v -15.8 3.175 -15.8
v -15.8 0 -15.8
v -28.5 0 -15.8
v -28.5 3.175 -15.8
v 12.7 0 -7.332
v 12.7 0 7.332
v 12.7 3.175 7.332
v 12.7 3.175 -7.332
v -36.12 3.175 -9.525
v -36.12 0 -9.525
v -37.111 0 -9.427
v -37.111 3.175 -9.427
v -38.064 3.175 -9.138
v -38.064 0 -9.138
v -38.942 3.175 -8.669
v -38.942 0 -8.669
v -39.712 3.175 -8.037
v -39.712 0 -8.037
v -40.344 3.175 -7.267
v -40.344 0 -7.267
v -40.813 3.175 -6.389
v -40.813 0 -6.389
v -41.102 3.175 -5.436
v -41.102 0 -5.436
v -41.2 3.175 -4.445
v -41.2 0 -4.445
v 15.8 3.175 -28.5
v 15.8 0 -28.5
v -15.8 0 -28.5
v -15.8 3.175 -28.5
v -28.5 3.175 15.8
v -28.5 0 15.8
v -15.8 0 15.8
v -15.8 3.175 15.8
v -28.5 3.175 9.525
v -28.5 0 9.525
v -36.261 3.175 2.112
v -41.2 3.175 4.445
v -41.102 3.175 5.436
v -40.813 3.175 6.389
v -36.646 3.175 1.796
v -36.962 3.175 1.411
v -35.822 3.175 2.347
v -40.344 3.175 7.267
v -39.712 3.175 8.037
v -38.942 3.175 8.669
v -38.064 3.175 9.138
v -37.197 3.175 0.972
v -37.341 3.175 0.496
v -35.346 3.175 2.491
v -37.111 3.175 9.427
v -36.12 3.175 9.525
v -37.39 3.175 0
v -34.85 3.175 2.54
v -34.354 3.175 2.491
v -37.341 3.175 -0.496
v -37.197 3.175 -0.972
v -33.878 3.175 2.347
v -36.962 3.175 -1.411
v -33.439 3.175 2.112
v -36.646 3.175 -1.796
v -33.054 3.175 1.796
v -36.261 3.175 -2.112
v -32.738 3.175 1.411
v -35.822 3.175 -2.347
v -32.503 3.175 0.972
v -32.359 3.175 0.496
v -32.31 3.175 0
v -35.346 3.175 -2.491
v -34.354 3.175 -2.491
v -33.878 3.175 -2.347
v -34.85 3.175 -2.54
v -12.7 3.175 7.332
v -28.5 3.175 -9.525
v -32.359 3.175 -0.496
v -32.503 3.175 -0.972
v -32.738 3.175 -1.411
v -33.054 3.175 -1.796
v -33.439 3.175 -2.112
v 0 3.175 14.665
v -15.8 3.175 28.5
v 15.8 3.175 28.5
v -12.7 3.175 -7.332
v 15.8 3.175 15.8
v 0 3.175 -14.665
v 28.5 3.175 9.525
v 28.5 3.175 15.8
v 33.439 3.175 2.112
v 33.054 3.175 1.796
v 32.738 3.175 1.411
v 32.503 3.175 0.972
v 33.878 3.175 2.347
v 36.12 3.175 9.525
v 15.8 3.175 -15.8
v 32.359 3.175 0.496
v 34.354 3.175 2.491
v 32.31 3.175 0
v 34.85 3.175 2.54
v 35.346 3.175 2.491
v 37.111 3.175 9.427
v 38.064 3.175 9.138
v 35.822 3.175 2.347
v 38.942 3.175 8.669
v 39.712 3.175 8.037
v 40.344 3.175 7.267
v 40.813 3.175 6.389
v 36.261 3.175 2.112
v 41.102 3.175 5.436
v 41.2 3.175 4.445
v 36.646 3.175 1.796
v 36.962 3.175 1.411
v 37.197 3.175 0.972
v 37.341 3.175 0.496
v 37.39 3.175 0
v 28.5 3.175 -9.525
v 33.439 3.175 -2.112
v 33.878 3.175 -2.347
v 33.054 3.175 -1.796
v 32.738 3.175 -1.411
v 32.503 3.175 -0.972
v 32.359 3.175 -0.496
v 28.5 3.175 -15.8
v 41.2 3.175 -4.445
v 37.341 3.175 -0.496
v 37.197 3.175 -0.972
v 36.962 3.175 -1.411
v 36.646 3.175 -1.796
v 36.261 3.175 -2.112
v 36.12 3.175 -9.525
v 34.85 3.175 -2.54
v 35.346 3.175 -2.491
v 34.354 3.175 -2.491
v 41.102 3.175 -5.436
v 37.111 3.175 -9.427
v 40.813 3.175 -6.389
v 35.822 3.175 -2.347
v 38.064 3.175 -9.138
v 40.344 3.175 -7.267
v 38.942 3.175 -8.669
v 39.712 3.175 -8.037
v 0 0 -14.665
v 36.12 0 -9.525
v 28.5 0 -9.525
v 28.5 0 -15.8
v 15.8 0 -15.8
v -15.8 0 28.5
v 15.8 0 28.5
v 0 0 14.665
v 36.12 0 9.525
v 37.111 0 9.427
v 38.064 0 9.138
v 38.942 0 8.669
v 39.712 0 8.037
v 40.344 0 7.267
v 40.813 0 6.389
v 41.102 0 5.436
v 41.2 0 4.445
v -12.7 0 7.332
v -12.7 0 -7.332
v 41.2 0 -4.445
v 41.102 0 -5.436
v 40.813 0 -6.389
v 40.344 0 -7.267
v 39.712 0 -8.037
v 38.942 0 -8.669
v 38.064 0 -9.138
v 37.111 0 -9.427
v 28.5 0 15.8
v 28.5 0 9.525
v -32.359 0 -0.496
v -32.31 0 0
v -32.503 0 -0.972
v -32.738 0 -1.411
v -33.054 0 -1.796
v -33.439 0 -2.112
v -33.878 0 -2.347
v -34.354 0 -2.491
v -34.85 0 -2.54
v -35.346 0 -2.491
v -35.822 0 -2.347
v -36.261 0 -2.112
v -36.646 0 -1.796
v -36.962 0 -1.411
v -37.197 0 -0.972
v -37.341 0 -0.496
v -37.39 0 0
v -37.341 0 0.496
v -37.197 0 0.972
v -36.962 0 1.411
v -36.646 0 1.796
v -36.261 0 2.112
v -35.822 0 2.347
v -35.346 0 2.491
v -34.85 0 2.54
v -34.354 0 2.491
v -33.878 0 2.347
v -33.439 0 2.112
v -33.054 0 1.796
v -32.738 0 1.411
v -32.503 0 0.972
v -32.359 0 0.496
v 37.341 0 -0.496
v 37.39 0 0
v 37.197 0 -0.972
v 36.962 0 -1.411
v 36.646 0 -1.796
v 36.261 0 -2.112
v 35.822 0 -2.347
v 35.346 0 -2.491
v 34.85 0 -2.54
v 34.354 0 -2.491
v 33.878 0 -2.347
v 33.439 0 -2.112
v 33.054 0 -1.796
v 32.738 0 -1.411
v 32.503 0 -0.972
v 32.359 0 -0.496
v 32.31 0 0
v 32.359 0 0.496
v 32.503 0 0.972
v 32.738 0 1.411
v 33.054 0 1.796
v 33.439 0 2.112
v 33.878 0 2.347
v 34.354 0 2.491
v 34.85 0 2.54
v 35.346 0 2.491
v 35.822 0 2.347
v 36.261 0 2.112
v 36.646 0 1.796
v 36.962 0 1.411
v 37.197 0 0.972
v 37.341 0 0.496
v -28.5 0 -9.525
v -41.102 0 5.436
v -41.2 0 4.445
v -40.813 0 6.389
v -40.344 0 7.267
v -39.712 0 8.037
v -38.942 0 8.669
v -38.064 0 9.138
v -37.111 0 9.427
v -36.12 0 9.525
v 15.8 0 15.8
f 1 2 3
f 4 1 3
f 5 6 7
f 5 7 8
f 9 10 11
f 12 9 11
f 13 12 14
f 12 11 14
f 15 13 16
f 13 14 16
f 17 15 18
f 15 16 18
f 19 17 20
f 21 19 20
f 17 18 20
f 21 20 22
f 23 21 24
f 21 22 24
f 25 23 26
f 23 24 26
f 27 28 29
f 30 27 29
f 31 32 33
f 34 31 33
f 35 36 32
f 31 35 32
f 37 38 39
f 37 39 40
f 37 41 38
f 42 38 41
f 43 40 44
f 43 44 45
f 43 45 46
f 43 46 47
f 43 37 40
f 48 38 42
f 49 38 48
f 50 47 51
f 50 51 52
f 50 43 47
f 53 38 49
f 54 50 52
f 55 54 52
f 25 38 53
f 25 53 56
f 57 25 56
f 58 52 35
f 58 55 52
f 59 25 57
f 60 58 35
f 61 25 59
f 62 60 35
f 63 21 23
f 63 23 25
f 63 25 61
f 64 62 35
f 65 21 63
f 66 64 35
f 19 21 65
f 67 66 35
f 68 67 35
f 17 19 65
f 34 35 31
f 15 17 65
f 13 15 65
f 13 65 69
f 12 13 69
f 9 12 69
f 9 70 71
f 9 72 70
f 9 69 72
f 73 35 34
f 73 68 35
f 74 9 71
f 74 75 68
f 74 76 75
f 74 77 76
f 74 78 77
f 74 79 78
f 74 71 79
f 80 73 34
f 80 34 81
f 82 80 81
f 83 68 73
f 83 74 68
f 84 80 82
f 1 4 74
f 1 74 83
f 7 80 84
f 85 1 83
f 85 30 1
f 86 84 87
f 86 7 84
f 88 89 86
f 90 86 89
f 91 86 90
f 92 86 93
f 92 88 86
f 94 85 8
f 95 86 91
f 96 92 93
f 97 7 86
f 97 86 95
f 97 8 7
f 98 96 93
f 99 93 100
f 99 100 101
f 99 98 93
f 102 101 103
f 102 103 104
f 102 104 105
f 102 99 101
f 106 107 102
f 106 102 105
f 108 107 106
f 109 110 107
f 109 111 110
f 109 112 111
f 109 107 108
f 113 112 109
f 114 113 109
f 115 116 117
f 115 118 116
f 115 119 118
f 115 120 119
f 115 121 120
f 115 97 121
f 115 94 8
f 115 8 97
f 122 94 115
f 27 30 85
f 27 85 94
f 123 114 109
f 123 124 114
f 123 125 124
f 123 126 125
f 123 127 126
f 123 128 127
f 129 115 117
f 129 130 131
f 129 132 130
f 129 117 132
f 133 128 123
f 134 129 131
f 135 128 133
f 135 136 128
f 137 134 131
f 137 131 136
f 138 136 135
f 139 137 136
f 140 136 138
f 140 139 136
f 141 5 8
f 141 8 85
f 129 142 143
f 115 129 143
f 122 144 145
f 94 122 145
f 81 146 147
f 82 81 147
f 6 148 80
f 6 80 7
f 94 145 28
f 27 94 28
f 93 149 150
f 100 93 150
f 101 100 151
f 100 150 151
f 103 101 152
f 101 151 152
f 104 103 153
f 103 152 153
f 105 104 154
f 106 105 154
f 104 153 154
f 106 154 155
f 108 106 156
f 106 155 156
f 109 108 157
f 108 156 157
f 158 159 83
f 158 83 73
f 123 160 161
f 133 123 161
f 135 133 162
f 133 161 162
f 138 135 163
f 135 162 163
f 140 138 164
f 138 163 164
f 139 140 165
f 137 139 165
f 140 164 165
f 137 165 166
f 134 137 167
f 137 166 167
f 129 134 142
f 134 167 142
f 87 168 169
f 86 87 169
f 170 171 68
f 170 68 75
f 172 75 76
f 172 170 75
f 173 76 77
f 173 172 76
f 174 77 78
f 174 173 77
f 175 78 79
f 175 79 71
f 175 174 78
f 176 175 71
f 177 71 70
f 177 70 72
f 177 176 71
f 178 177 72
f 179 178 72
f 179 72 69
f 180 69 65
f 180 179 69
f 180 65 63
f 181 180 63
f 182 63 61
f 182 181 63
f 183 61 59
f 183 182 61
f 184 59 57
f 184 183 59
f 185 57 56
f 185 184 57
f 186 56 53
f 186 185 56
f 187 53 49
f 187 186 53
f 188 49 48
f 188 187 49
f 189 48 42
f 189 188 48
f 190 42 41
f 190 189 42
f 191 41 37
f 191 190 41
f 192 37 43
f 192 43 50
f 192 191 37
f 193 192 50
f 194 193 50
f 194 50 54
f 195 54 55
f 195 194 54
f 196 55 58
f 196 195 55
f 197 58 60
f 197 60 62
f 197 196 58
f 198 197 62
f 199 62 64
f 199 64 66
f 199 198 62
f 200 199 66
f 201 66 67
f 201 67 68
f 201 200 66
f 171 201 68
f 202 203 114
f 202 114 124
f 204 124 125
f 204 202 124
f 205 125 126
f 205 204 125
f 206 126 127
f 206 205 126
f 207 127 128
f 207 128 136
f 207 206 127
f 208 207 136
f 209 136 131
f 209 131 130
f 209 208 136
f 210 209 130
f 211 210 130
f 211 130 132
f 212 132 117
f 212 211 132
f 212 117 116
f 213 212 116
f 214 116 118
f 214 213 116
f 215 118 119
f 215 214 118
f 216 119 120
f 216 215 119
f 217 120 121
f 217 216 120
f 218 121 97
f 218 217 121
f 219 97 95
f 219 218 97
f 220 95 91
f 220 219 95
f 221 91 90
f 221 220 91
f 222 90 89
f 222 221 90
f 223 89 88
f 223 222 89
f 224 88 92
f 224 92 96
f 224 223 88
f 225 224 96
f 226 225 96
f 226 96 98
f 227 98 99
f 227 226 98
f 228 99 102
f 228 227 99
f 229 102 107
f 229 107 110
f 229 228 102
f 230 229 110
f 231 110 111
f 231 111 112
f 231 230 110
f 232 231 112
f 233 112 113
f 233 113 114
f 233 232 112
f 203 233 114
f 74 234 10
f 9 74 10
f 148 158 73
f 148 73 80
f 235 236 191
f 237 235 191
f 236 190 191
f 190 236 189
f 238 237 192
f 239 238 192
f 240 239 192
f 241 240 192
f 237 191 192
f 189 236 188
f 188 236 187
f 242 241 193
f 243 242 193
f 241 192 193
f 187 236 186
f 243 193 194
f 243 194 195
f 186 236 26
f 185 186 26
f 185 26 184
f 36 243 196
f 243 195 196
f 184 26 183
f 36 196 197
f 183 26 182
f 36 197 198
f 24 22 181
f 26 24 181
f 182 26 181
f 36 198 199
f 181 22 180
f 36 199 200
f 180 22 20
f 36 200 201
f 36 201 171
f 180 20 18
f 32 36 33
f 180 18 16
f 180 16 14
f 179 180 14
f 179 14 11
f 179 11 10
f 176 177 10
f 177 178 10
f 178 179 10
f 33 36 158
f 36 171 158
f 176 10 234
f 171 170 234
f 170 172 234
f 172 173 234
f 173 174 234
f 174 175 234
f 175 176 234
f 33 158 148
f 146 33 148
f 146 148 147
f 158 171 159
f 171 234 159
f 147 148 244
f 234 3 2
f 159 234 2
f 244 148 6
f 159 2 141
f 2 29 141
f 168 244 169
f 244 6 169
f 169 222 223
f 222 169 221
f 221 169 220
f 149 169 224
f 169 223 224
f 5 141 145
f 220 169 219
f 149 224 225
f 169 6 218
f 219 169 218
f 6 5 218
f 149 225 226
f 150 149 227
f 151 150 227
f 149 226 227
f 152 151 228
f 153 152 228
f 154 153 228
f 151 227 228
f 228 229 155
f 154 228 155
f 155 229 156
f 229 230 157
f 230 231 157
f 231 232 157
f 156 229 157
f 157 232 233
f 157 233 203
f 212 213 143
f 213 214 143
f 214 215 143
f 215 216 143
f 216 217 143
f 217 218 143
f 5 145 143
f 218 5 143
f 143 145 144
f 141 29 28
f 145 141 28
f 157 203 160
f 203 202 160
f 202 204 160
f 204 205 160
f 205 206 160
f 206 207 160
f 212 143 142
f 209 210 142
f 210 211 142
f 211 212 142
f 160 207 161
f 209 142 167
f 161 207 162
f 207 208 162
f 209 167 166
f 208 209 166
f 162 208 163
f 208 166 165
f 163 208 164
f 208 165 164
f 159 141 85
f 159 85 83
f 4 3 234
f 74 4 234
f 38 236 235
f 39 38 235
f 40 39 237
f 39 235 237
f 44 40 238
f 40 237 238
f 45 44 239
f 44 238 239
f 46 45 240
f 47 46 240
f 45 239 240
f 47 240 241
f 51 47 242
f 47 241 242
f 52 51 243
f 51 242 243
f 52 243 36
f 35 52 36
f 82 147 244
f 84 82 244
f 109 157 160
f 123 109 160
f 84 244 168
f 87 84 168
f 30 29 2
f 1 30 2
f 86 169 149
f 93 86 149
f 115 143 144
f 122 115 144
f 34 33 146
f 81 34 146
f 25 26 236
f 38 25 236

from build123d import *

# Parameters (mm, degrees)
SKETCH1_R           = 2.54
BOSS_EXTRUDE1_DEPTH = 3.175


with BuildPart() as part:
    # Sketch1 → Boss-Extrude1 (new body)
    with BuildSketch(Plane(origin=(0, 0, 0), x_dir=(1, 0, 0), z_dir=(0, 1, 0))):
        with BuildLine():
            Line((-28.4999938, 15.7999938), (-28.4999938, 9.525))
            Line((-28.4999938, 9.525), (-36.1199938, 9.525))
            ThreePointArc((-36.1199938, 9.525), (-39.712096248, 8.037102448), (-41.1999938, 4.445))
            Line((-41.1999938, 4.445), (-41.1999938, -4.445))
            ThreePointArc((-41.1999938, -4.445), (-39.712096248, -8.037102448), (-36.1199938, -9.525))
            Line((-36.1199938, -9.525), (-28.4999938, -9.525))
            Line((-28.4999938, -9.525), (-28.4999938, -15.7999938))
            Line((-28.4999938, -15.7999938), (-15.7999938, -15.7999938))
            Line((-15.7999938, -15.7999938), (-15.7999938, -28.4999938))
            Line((-15.7999938, -28.4999938), (15.7999938, -28.4999938))
            Line((15.7999938, -28.4999938), (15.7999938, -15.7999938))
            Line((15.7999938, -15.7999938), (28.4999938, -15.7999938))
            Line((28.4999938, -15.7999938), (28.4999938, -9.525))
            Line((28.4999938, -9.525), (36.1199938, -9.525))
            ThreePointArc((36.1199938, -9.525), (39.712096248, -8.037102448), (41.1999938, -4.445))
            Line((41.1999938, -4.445), (41.1999938, 4.445))
            ThreePointArc((41.1999938, 4.445), (39.712096248, 8.037102448), (36.1199938, 9.525))
            Line((36.1199938, 9.525), (28.4999938, 9.525))
            Line((28.4999938, 9.525), (28.4999938, 15.7999938))
            Line((28.4999938, 15.7999938), (15.7999938, 15.7999938))
            Line((15.7999938, 15.7999938), (15.7999938, 28.4999938))
            Line((15.7999938, 28.4999938), (-15.7999938, 28.4999938))
            Line((-15.7999938, 28.4999938), (-15.7999938, 15.7999938))
            Line((-15.7999938, 15.7999938), (-28.4999938, 15.7999938))
        make_face()
        with Locations((-34.8499938, 0)):
            Circle(SKETCH1_R, mode=Mode.SUBTRACT)
        with Locations((34.8499938, 0)):
            Circle(SKETCH1_R, mode=Mode.SUBTRACT)
        Polygon((0, 14.664696837), (-12.7, 7.332348419), (-12.7, -7.332348419), (0, -14.664696837), (12.7, -7.332348419), (12.7, 7.332348419), align=None, mode=Mode.SUBTRACT)
    extrude(amount=BOSS_EXTRUDE1_DEPTH)


solid = part.part
